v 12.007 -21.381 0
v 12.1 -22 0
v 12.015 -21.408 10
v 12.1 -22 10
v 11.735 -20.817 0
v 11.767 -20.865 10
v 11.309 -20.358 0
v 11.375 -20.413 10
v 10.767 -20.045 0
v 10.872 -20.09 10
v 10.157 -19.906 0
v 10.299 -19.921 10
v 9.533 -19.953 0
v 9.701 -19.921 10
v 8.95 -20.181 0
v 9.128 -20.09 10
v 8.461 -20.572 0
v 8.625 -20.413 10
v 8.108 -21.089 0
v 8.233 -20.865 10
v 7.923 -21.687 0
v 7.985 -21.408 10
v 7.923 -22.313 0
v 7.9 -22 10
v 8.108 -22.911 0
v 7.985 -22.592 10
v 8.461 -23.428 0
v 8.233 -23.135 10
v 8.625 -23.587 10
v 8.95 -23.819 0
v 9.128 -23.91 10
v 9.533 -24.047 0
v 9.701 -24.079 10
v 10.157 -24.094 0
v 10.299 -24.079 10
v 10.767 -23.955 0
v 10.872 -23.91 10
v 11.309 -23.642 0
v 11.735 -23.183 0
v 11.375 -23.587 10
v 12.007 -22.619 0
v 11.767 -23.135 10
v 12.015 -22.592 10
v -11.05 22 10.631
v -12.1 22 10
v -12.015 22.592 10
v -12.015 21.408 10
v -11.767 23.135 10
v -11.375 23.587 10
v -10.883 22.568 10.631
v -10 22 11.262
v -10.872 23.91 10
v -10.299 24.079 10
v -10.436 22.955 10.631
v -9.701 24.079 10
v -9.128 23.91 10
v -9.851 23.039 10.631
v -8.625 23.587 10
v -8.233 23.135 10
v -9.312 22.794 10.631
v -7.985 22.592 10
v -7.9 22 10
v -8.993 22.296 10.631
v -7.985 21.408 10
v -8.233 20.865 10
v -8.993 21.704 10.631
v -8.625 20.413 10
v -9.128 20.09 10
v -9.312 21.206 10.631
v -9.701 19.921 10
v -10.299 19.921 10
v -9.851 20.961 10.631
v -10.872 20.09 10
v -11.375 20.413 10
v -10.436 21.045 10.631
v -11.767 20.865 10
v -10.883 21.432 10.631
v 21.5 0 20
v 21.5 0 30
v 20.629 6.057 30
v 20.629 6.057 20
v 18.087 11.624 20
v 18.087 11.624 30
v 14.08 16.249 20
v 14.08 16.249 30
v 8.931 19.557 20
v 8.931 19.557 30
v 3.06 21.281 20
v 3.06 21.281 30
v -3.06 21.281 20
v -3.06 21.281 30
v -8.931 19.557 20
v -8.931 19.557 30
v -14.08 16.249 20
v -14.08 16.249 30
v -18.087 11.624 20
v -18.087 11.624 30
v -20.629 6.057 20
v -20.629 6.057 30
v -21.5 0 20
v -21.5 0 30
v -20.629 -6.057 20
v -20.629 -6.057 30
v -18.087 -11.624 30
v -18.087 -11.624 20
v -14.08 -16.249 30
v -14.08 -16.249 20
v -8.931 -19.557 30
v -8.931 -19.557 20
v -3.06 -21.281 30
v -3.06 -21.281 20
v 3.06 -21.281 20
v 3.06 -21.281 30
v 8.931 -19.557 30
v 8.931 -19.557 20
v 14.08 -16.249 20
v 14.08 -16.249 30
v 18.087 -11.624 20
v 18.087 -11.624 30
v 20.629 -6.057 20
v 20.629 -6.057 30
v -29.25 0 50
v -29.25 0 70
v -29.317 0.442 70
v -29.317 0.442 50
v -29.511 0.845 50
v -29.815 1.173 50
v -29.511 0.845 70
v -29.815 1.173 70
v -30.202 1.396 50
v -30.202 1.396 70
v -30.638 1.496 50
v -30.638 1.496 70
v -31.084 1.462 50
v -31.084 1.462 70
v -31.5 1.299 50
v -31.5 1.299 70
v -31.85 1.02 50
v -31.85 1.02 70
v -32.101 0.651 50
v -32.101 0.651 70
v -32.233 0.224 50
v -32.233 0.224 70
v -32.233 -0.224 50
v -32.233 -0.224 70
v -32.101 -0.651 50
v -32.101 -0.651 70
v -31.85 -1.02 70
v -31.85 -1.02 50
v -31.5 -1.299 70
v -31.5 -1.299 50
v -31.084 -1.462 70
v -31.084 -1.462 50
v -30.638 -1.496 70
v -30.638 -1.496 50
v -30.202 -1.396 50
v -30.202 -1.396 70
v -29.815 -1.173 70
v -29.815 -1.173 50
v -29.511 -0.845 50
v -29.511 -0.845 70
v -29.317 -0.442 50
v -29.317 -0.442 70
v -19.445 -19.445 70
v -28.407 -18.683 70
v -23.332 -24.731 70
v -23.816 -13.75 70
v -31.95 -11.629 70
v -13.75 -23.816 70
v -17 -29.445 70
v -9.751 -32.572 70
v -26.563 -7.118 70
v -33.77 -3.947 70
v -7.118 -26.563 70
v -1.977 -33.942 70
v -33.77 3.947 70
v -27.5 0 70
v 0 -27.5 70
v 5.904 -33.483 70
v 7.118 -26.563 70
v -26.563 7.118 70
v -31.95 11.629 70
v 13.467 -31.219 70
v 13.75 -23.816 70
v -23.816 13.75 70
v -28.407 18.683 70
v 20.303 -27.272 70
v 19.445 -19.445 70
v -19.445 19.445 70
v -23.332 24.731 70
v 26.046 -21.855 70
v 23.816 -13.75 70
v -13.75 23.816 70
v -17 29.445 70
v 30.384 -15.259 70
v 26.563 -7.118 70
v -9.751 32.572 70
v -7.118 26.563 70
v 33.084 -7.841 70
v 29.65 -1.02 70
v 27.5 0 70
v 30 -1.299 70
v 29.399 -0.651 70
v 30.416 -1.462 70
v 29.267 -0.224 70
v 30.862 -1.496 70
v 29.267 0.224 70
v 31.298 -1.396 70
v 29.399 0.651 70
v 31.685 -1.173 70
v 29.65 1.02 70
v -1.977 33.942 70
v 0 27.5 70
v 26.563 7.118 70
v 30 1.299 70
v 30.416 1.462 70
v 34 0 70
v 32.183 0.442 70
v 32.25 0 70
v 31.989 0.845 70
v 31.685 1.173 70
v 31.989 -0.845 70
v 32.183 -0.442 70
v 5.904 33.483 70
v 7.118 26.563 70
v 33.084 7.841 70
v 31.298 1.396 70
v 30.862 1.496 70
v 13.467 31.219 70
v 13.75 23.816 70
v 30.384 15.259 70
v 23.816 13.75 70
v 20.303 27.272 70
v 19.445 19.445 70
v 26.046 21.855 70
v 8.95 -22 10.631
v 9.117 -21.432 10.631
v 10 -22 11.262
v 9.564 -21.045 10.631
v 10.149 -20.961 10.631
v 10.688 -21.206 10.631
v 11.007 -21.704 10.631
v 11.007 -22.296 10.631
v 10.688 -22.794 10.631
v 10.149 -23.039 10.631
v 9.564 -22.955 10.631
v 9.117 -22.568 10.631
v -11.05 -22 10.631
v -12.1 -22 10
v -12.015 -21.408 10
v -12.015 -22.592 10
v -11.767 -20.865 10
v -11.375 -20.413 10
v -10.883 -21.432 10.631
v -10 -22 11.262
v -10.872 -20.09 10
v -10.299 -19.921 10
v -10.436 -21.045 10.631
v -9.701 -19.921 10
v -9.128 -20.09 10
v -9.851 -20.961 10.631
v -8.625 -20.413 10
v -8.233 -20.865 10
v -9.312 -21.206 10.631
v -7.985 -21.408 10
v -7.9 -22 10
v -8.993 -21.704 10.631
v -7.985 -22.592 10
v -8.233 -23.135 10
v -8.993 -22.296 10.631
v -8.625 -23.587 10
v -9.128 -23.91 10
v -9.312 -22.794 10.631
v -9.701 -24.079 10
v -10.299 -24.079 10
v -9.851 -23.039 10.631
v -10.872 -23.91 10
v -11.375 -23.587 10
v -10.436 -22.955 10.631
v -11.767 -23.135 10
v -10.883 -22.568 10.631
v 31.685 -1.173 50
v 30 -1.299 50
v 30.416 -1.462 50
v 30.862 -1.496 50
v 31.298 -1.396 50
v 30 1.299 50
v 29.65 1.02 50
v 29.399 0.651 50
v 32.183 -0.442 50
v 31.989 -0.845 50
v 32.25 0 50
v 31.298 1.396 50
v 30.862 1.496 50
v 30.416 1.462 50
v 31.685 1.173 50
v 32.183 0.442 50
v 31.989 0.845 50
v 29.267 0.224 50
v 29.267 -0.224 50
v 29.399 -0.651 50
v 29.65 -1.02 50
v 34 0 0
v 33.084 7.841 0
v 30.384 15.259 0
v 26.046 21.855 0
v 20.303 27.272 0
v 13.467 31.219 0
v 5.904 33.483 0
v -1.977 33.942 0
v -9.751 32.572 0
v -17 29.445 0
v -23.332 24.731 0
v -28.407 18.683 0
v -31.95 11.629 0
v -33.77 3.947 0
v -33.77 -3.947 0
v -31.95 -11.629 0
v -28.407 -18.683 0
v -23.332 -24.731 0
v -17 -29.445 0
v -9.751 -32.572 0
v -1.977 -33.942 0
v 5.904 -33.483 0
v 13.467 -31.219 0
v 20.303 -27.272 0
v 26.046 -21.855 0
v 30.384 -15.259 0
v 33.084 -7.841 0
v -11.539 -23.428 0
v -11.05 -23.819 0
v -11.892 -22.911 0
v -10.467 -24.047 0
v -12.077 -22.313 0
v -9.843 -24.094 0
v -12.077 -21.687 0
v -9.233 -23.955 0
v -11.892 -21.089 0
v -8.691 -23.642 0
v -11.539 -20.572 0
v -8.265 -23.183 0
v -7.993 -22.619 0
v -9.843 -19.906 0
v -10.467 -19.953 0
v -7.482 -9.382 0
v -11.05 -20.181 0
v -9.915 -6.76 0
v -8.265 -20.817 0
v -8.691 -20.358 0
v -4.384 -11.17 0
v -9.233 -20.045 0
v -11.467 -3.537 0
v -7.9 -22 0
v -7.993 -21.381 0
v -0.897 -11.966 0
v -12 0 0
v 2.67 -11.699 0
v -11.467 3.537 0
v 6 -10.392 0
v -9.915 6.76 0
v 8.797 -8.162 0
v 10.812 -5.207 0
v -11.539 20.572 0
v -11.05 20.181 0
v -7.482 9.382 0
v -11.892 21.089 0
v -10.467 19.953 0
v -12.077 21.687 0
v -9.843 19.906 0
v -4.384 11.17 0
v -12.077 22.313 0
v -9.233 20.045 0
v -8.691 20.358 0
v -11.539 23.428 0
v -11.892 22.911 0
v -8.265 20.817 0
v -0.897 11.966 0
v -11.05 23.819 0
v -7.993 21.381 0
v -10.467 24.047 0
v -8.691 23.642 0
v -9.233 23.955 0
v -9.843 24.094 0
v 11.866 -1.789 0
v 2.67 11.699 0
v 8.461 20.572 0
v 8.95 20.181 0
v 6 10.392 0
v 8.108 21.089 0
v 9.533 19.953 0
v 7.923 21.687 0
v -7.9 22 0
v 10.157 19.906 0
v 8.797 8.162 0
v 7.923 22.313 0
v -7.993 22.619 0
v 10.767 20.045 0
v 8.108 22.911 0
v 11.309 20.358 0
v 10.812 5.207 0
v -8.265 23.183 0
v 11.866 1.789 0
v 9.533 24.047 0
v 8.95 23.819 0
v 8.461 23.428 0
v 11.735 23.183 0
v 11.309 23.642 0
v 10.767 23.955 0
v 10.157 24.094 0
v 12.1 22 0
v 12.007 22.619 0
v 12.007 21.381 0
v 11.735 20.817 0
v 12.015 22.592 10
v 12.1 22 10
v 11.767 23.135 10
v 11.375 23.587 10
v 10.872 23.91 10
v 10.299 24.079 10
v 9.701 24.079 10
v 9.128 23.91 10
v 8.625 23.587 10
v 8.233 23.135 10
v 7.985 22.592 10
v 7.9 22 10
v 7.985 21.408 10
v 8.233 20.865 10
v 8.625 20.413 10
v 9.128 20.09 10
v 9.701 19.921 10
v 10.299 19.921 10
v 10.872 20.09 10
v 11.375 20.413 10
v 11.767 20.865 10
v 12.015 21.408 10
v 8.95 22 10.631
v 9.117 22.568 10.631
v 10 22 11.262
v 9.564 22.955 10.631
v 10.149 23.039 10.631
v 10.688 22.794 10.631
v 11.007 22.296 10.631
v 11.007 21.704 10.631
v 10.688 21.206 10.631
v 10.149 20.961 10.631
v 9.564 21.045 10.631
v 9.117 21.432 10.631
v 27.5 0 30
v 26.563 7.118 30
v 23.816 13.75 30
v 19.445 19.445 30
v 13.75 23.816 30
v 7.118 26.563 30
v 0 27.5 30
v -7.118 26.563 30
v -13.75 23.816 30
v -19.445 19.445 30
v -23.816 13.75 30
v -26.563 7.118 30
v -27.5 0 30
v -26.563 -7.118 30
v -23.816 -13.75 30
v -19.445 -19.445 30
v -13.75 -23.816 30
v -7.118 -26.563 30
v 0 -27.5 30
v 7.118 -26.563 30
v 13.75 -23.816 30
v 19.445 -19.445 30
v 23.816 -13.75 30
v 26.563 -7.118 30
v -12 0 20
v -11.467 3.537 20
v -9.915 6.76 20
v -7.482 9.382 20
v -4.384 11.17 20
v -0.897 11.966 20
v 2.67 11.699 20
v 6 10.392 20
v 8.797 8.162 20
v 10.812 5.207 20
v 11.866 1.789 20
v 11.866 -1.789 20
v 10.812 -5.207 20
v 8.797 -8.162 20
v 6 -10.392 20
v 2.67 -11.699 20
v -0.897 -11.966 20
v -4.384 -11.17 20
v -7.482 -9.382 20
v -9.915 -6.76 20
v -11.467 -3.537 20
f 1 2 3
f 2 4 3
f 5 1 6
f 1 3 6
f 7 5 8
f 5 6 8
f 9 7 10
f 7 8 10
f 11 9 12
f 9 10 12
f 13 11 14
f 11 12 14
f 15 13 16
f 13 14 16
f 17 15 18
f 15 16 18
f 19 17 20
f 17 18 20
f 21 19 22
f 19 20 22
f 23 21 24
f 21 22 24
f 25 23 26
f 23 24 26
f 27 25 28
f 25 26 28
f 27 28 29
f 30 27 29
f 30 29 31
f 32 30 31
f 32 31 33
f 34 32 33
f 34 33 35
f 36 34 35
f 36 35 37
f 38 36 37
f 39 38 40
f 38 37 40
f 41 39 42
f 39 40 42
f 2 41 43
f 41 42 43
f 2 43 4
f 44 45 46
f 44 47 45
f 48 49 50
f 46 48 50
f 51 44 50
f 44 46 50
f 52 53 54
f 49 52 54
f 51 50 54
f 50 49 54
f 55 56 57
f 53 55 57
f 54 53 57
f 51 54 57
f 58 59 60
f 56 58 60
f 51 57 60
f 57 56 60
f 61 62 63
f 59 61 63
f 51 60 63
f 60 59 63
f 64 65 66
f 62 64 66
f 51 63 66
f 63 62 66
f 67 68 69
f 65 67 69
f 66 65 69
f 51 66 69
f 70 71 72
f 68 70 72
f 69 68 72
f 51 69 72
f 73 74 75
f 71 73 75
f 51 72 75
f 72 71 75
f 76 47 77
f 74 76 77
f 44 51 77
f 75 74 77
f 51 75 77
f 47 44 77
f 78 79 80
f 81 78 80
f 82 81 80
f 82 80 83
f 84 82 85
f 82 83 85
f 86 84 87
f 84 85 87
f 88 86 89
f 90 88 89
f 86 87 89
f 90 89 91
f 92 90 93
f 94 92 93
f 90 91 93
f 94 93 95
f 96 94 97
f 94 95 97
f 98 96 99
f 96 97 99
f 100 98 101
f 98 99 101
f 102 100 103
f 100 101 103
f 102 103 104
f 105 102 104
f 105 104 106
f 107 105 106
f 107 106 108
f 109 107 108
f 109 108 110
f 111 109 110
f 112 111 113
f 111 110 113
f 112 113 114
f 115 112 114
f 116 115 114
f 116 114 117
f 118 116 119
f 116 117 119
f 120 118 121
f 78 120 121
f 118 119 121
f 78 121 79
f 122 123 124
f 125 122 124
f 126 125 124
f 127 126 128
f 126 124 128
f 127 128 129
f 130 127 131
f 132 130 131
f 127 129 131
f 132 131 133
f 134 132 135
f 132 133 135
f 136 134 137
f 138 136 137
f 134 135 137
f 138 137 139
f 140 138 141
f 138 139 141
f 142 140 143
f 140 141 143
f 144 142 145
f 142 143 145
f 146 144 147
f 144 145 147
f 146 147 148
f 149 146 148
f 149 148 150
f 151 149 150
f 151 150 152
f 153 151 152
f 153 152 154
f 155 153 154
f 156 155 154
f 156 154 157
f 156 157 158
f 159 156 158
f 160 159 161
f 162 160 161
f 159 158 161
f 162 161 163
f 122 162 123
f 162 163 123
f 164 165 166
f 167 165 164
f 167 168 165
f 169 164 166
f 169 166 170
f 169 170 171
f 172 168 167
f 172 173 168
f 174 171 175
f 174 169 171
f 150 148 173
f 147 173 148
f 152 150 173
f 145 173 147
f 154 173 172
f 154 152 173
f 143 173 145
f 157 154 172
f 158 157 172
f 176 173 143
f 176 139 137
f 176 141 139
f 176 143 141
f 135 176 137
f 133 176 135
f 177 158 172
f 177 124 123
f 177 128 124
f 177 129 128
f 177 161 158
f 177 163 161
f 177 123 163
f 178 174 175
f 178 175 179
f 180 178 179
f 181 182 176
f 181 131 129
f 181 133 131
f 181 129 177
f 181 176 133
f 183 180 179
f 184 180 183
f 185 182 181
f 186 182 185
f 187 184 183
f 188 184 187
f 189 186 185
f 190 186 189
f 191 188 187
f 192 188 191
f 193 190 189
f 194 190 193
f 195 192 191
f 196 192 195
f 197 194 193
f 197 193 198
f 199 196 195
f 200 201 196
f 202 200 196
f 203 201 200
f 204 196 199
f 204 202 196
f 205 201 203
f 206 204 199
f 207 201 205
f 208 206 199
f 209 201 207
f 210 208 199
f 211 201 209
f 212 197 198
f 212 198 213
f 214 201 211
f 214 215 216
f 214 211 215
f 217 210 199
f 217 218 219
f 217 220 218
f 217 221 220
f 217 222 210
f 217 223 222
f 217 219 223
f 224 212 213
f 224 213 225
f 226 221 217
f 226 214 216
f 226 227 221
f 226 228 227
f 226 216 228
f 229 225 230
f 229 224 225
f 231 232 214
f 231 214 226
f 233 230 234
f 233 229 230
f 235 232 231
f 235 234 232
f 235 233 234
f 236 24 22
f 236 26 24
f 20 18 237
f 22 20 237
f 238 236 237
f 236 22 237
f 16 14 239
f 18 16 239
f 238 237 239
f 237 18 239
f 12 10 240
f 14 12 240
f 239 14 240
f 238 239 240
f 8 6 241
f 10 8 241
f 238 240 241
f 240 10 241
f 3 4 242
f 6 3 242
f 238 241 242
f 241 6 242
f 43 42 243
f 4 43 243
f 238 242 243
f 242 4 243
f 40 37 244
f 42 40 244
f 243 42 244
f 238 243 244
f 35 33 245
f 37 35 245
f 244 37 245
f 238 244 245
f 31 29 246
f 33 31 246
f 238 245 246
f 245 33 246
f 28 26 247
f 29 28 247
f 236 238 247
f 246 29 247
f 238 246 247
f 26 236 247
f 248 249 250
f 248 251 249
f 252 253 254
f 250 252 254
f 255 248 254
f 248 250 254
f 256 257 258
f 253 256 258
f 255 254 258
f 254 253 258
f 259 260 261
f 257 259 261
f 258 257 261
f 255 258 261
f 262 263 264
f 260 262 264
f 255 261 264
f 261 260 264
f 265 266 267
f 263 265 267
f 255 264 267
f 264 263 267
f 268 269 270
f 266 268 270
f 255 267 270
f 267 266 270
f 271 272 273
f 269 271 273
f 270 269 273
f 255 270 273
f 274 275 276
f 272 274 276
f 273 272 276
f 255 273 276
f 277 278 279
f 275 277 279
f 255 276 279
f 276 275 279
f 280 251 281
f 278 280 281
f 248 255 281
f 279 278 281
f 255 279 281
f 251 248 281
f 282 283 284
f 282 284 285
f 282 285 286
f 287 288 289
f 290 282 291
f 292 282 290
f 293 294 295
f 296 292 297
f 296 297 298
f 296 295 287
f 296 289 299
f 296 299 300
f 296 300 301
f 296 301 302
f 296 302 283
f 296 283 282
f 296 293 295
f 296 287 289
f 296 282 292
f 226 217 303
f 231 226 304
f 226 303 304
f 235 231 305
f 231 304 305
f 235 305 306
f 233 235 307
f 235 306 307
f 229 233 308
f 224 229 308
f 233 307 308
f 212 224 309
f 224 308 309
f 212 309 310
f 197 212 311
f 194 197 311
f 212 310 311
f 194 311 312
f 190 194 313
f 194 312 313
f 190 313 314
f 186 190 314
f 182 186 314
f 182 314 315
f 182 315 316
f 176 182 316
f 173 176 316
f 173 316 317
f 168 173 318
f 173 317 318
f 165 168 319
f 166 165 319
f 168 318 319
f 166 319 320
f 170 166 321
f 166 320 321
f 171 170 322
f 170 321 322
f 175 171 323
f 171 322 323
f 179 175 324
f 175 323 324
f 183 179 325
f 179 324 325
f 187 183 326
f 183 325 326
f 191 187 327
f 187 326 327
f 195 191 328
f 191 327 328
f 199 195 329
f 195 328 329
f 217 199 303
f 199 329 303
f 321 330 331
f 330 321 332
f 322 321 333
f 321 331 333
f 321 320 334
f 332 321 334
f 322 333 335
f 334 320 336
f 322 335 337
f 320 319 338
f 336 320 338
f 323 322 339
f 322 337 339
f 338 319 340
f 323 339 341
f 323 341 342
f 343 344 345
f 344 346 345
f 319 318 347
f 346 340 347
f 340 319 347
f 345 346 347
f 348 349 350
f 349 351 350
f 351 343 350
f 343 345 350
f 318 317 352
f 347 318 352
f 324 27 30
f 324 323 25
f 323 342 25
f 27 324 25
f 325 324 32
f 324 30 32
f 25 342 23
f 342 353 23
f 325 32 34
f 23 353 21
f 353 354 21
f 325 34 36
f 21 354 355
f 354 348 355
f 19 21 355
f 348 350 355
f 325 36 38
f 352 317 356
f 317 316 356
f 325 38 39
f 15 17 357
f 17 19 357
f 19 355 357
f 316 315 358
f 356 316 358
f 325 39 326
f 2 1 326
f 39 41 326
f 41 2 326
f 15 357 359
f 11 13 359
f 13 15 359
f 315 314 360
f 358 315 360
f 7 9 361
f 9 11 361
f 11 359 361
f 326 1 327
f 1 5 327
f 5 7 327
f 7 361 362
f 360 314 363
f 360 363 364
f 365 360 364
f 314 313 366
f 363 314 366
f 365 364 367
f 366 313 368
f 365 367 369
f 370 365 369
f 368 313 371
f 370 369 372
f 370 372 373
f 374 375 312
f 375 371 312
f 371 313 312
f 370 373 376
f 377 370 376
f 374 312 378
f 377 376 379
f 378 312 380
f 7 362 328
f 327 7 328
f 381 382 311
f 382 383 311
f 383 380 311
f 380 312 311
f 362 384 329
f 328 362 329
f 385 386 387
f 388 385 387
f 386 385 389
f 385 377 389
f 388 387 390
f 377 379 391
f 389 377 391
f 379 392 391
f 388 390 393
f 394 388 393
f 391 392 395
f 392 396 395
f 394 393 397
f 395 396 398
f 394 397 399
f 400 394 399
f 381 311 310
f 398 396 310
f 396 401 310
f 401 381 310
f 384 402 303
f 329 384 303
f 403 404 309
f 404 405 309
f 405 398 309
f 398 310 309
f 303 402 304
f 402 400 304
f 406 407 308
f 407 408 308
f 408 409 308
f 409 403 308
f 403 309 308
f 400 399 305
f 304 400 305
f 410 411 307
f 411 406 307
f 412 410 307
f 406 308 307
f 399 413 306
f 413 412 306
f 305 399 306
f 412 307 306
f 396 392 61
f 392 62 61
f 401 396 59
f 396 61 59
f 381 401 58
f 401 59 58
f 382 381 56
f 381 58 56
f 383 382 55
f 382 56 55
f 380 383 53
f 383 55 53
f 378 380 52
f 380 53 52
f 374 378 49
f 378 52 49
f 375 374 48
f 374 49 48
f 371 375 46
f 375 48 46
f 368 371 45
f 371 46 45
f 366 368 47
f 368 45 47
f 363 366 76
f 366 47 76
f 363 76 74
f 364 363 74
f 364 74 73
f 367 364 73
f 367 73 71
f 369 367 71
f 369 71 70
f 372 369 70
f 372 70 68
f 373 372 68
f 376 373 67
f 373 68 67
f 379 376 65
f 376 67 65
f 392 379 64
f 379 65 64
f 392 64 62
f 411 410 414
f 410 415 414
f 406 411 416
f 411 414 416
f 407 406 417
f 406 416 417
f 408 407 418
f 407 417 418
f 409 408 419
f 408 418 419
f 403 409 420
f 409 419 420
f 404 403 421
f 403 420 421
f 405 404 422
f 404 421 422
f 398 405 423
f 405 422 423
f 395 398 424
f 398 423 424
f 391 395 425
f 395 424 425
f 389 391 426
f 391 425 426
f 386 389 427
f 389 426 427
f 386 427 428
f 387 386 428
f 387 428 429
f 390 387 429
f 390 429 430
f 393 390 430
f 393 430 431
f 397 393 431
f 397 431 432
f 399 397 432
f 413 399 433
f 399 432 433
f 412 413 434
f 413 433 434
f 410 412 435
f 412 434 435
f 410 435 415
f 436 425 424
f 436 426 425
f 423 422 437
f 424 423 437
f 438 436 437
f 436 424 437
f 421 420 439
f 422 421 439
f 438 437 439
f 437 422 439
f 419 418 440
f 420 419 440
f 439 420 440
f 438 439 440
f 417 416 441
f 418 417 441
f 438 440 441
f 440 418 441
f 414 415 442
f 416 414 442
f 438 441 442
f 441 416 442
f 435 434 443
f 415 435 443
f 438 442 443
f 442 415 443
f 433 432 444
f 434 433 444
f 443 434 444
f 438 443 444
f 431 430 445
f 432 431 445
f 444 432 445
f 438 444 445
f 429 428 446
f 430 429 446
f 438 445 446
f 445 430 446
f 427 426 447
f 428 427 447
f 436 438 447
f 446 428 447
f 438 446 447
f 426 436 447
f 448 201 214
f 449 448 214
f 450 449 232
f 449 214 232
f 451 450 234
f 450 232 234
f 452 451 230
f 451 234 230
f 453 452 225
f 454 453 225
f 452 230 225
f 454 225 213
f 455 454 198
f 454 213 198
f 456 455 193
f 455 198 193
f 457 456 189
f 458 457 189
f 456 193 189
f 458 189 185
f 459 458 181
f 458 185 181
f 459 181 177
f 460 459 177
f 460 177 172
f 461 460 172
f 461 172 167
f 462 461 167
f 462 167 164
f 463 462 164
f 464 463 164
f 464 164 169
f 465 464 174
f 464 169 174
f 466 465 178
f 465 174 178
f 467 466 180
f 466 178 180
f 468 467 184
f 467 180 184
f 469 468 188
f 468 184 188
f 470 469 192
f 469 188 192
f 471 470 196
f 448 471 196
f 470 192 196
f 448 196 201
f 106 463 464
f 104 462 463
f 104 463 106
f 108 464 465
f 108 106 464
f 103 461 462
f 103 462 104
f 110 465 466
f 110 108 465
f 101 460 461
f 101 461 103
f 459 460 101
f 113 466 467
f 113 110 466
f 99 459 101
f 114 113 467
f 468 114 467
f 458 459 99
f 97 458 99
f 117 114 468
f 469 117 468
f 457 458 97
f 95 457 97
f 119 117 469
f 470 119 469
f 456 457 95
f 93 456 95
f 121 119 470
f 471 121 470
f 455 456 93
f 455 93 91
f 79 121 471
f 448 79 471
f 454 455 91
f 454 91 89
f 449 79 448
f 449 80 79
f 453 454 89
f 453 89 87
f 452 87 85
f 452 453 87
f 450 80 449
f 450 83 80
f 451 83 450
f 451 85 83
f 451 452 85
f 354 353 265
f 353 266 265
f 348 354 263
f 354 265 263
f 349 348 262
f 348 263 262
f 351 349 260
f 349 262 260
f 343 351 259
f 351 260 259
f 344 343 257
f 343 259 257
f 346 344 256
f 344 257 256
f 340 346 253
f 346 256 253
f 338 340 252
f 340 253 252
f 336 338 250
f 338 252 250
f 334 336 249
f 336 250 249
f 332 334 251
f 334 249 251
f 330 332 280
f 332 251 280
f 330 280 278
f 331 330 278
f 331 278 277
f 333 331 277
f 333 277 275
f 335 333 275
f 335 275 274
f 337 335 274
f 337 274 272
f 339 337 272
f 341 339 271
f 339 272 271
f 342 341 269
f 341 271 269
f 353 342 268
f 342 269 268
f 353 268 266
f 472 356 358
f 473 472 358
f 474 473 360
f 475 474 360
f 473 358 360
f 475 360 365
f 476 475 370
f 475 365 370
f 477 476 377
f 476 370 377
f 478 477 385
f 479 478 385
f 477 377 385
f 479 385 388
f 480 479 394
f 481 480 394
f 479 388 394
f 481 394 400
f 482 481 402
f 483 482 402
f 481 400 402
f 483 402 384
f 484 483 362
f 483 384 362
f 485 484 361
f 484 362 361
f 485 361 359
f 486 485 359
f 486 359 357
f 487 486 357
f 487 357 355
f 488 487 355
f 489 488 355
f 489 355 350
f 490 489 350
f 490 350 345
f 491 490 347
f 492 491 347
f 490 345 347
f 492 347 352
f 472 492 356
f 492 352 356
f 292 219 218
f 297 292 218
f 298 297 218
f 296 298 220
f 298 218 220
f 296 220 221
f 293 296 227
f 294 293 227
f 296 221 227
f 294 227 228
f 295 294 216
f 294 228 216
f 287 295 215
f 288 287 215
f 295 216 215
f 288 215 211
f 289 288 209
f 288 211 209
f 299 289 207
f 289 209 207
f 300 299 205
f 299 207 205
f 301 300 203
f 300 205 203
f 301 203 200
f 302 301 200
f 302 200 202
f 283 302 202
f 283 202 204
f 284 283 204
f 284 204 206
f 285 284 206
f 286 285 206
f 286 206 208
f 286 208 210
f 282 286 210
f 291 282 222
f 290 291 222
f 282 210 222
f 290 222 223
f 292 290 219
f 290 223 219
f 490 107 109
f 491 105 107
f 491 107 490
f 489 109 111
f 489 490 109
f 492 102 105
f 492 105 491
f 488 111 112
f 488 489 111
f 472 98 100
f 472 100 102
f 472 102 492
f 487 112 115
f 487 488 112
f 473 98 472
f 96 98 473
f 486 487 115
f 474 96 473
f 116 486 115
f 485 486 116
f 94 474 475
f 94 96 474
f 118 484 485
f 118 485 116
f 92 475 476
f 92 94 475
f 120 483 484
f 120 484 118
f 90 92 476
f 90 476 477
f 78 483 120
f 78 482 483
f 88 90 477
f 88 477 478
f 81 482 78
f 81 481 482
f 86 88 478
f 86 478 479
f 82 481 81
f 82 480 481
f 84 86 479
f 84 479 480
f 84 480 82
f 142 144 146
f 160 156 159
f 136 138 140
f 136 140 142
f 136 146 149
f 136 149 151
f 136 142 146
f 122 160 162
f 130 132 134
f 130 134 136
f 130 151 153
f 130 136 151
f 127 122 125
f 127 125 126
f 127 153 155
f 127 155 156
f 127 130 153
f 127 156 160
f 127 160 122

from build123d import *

# Parameters (mm, degrees)
SKETCH5_R                 = 34
BOSS_EXTRUDE1_DEPTH       = 70
SKETCH6_R                 = 27.5
CUT_EXTRUDE1_DEPTH        = 40
SKETCH7_R                 = 21.5
CUT_EXTRUDE2_DEPTH        = 10
SKETCH8_R                 = 12
CUT_EXTRUDE3_DEPTH        = 20
SKETCH9_R                 = 1.5
CUT_EXTRUDE4_DEPTH        = 20
M5X0_8_TAPPED_HOLE1_D     = 4.2
M5X0_8_TAPPED_HOLE1_DEPTH = 10
M5X0_8_TAPPED_HOLE1_TIP   = 1.2618073


with BuildPart() as part:
    # Sketch5 → Boss-Extrude1 (new body)
    with BuildSketch(Plane.XY):
        Circle(SKETCH5_R)
    extrude(amount=BOSS_EXTRUDE1_DEPTH)

    # Sketch6 → Cut-Extrude1 (cut)
    with BuildSketch(Plane.XY.offset(70)):
        Circle(SKETCH6_R)
    extrude(amount=-CUT_EXTRUDE1_DEPTH, mode=Mode.SUBTRACT)

    # Sketch7 → Cut-Extrude2 (cut)
    with BuildSketch(Plane.XY.offset(30)):
        Circle(SKETCH7_R)
    extrude(amount=-CUT_EXTRUDE2_DEPTH, mode=Mode.SUBTRACT)

    # Sketch8 → Cut-Extrude3 (cut)
    with BuildSketch(Plane(origin=(0, 0, 0), x_dir=(-1, 0, 0), z_dir=(0, 0, -1))):
        Circle(SKETCH8_R)
    extrude(amount=-CUT_EXTRUDE3_DEPTH, mode=Mode.SUBTRACT)

    # Sketch9 → Cut-Extrude4 (cut)
    with BuildSketch(Plane.XY.offset(70)):
        with Locations((-30.75, 0)):
            Circle(SKETCH9_R)
        with Locations((30.75, 0)):
            Circle(SKETCH9_R)
    extrude(amount=-CUT_EXTRUDE4_DEPTH, mode=Mode.SUBTRACT)

    # M5x0.8 Tapped Hole1
    with Locations(Plane(origin=(0, 0, 0), x_dir=(-1, 0, 0), z_dir=(0, 0, -1))):
        with Locations((-10, 22), (10, 22), (10, -22), (-10, -22)):
            Hole(M5X0_8_TAPPED_HOLE1_D / 2, depth=M5X0_8_TAPPED_HOLE1_DEPTH)
            with Locations((0, 0, -(M5X0_8_TAPPED_HOLE1_DEPTH + M5X0_8_TAPPED_HOLE1_TIP / 2))):  # 118° drill point
                Cone(0, M5X0_8_TAPPED_HOLE1_D / 2, M5X0_8_TAPPED_HOLE1_TIP, mode=Mode.SUBTRACT)


solid = part.part
